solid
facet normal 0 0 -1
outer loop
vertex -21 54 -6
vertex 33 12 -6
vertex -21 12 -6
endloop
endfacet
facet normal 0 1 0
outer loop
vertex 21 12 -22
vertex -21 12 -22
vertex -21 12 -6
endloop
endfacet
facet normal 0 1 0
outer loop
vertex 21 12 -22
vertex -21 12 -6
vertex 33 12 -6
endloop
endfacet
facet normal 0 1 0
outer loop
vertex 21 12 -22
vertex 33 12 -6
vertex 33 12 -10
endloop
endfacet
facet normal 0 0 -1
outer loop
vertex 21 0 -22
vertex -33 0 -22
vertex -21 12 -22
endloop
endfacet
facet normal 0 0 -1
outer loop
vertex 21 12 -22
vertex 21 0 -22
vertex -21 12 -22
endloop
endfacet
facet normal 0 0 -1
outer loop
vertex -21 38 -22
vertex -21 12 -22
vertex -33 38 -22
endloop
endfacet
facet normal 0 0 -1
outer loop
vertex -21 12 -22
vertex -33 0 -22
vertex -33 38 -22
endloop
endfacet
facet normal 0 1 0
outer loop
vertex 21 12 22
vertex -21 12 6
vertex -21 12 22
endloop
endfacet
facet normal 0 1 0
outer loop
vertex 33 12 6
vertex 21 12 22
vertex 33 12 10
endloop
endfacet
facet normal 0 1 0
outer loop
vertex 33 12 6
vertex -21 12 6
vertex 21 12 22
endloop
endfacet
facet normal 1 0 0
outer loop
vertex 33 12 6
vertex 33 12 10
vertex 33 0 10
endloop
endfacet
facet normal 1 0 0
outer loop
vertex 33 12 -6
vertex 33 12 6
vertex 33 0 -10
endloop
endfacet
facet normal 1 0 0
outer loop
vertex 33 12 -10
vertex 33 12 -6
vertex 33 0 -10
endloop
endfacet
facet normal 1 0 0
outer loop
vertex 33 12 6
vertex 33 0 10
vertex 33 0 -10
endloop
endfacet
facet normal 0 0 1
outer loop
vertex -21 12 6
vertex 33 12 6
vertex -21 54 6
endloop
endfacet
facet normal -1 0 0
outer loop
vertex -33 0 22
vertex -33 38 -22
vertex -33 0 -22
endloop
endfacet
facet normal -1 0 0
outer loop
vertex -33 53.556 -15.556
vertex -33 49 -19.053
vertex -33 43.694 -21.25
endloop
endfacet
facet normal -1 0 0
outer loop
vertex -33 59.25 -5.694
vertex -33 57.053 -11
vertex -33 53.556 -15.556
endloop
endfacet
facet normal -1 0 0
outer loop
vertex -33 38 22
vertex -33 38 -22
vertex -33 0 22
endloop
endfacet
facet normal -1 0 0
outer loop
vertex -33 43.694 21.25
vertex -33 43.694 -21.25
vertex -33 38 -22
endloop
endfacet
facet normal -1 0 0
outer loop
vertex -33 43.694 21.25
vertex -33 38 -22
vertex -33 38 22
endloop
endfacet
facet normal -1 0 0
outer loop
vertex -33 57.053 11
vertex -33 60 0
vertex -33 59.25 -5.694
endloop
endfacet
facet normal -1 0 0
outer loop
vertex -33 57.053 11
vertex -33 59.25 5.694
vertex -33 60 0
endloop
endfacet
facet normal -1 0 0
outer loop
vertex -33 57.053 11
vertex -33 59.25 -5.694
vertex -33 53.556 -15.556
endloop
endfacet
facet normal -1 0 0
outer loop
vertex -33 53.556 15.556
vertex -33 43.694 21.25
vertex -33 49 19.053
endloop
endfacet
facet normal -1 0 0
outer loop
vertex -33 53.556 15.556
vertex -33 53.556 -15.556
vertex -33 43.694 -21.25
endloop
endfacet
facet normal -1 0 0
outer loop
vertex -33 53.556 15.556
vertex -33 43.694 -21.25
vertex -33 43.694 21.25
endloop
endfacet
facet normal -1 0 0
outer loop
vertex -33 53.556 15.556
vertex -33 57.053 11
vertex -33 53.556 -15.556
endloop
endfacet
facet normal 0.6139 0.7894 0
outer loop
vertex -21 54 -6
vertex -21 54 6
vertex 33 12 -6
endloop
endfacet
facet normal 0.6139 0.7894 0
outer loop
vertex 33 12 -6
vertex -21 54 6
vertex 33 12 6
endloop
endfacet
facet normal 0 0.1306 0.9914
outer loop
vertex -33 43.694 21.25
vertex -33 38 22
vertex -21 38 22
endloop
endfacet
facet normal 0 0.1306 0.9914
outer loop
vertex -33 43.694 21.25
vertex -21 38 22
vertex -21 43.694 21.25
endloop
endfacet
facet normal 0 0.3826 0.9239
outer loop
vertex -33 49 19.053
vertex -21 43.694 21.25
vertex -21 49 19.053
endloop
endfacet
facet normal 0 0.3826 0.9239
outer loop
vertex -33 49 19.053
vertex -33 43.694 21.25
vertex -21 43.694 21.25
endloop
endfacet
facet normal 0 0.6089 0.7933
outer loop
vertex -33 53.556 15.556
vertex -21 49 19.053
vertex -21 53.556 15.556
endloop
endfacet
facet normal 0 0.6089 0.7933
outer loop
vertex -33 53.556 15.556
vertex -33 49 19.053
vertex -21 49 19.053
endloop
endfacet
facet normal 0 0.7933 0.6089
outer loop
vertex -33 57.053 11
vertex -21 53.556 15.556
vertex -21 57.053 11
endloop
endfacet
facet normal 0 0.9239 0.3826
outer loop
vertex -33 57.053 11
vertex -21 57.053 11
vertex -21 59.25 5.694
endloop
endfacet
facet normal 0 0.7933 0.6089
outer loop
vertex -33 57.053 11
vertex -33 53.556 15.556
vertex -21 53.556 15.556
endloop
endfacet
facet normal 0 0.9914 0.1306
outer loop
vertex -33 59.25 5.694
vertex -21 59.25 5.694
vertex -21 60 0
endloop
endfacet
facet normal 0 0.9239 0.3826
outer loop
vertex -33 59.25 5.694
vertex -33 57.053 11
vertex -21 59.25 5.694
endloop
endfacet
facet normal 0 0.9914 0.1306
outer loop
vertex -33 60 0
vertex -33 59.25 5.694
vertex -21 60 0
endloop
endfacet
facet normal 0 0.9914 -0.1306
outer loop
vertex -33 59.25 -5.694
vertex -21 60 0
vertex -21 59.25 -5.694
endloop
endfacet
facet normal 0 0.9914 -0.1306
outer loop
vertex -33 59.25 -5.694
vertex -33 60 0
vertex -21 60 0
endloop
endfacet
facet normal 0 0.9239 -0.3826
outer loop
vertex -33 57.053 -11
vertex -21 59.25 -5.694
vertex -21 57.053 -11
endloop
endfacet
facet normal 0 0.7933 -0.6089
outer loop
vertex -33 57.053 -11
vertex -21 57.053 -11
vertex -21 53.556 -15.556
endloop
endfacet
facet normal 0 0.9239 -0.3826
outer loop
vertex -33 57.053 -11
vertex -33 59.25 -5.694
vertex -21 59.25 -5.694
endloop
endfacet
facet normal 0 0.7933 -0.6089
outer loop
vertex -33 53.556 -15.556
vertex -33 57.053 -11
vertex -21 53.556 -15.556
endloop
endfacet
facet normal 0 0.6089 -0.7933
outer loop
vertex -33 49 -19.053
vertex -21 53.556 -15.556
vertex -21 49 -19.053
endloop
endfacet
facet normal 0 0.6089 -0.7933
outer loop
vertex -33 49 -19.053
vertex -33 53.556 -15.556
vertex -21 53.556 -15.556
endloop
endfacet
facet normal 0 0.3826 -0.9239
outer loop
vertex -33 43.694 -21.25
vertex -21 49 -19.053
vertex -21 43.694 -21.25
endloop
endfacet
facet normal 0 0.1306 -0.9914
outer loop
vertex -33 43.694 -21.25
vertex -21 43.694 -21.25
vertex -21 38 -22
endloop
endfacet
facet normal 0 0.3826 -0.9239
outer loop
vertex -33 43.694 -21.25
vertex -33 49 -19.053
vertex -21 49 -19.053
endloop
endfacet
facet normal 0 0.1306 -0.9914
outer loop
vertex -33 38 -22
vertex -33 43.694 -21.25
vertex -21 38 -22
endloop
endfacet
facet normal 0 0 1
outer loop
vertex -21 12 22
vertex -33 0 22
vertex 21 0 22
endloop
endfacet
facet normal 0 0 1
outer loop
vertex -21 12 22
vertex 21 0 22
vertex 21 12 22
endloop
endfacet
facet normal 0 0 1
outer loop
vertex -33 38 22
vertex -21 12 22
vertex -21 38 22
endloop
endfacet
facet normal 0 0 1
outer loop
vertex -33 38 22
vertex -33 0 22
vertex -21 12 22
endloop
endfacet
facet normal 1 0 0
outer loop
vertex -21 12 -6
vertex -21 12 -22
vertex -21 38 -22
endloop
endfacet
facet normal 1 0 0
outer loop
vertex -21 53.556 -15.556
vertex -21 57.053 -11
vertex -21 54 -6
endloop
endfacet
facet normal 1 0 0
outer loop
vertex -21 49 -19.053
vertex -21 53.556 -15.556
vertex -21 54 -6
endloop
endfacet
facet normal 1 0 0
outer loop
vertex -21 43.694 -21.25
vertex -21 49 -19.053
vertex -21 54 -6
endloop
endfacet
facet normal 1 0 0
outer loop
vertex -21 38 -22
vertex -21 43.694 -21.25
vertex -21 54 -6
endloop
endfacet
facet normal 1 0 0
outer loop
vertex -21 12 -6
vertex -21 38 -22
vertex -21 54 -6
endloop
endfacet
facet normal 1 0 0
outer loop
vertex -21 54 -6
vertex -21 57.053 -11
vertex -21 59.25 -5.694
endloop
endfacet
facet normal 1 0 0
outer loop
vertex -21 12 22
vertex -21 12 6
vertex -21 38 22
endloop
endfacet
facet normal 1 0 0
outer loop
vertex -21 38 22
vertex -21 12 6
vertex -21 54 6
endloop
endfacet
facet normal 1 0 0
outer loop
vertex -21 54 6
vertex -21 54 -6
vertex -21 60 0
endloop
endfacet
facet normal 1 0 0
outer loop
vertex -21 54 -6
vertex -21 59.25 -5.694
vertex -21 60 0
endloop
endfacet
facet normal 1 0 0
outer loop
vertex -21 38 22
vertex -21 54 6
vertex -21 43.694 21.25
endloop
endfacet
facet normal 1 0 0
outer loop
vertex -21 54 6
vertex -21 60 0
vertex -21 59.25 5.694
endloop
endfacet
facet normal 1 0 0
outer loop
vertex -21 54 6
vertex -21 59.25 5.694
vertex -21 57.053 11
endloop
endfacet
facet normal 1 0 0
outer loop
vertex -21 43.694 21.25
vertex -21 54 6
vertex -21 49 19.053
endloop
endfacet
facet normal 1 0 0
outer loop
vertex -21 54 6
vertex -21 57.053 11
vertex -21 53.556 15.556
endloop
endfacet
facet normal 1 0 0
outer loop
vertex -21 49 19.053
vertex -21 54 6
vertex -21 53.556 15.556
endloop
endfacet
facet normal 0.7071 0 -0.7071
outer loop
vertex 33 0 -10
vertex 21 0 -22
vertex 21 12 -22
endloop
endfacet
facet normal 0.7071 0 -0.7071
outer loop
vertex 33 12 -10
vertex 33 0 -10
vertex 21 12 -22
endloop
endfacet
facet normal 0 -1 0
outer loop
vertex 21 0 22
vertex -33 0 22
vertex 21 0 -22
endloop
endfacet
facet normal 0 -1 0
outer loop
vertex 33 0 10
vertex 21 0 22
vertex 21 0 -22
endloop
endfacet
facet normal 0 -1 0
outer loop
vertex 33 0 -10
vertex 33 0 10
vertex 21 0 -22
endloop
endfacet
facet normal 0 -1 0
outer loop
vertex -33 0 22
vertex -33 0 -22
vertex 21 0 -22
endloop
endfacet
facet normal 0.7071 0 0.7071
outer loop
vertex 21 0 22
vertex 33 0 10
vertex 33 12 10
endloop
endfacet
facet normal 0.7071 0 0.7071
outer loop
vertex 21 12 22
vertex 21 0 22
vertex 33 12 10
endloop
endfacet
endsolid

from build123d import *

# Parameters (mm, degrees)
SKETCH1_W           = 66
SKETCH1_H           = 44
BOSS_EXTRUDE1_DEPTH = 12
CHAMFER1_SIZE       = 12
SKETCH2_W           = 44
SKETCH2_H           = 48
BOSS_EXTRUDE2_DEPTH = 12
FILLET1_RADIUS      = 22
FILLET1_LENGTH      = 12
BOSS_EXTRUDE3_DEPTH = 6


with BuildPart() as part:
    # Sketch1 → Boss-Extrude1 (new body)
    with BuildSketch(Plane(origin=(0, 0, 0), x_dir=(1, 0, 0), z_dir=(0, 1, 0))):
        Rectangle(SKETCH1_W, SKETCH1_H)
    extrude(amount=BOSS_EXTRUDE1_DEPTH)

    # Chamfer1
    chamfer1_edges = [part.edges().sort_by_distance(p)[0] for p in [
        (33, 6, 22),
        (33, 6, -22),
    ]]
    chamfer(chamfer1_edges, length=CHAMFER1_SIZE)

    # Sketch2 → Boss-Extrude2 (add)
    with BuildSketch(Plane.ZY.offset(33)):
        with Locations((0, 36)):
            Rectangle(SKETCH2_W, SKETCH2_H)
    extrude(amount=-BOSS_EXTRUDE2_DEPTH)

    # Fillet1: full round fillet: the end face becomes a half cylinder, R = half its width
    fillet1_face = Plane((-27, 60, 0), x_dir=(-1, 0, 0), z_dir=(0, 1, 0))  # on the end face: x along it, z out of the body
    fillet1_slab = fillet1_face.offset(-FILLET1_RADIUS / 2) * Box(FILLET1_LENGTH, 2 * FILLET1_RADIUS, FILLET1_RADIUS, mode=Mode.PRIVATE)  # the body's end, R deep
    fillet1_round = Plane((-27, 38, 0), x_dir=(0, 1, 0), z_dir=(-1, 0, 0)) * Cylinder(FILLET1_RADIUS, FILLET1_LENGTH, mode=Mode.PRIVATE)  # its axis R under the face
    add(fillet1_slab - fillet1_round, mode=Mode.SUBTRACT)

    # Sketch4 → Boss-Extrude3 (add, symmetric)
    with BuildSketch(Plane.XY):
        Polygon((-21, 54), (33, 12), (-21, 12), align=None)
    extrude(amount=BOSS_EXTRUDE3_DEPTH, both=True)


solid = part.part
